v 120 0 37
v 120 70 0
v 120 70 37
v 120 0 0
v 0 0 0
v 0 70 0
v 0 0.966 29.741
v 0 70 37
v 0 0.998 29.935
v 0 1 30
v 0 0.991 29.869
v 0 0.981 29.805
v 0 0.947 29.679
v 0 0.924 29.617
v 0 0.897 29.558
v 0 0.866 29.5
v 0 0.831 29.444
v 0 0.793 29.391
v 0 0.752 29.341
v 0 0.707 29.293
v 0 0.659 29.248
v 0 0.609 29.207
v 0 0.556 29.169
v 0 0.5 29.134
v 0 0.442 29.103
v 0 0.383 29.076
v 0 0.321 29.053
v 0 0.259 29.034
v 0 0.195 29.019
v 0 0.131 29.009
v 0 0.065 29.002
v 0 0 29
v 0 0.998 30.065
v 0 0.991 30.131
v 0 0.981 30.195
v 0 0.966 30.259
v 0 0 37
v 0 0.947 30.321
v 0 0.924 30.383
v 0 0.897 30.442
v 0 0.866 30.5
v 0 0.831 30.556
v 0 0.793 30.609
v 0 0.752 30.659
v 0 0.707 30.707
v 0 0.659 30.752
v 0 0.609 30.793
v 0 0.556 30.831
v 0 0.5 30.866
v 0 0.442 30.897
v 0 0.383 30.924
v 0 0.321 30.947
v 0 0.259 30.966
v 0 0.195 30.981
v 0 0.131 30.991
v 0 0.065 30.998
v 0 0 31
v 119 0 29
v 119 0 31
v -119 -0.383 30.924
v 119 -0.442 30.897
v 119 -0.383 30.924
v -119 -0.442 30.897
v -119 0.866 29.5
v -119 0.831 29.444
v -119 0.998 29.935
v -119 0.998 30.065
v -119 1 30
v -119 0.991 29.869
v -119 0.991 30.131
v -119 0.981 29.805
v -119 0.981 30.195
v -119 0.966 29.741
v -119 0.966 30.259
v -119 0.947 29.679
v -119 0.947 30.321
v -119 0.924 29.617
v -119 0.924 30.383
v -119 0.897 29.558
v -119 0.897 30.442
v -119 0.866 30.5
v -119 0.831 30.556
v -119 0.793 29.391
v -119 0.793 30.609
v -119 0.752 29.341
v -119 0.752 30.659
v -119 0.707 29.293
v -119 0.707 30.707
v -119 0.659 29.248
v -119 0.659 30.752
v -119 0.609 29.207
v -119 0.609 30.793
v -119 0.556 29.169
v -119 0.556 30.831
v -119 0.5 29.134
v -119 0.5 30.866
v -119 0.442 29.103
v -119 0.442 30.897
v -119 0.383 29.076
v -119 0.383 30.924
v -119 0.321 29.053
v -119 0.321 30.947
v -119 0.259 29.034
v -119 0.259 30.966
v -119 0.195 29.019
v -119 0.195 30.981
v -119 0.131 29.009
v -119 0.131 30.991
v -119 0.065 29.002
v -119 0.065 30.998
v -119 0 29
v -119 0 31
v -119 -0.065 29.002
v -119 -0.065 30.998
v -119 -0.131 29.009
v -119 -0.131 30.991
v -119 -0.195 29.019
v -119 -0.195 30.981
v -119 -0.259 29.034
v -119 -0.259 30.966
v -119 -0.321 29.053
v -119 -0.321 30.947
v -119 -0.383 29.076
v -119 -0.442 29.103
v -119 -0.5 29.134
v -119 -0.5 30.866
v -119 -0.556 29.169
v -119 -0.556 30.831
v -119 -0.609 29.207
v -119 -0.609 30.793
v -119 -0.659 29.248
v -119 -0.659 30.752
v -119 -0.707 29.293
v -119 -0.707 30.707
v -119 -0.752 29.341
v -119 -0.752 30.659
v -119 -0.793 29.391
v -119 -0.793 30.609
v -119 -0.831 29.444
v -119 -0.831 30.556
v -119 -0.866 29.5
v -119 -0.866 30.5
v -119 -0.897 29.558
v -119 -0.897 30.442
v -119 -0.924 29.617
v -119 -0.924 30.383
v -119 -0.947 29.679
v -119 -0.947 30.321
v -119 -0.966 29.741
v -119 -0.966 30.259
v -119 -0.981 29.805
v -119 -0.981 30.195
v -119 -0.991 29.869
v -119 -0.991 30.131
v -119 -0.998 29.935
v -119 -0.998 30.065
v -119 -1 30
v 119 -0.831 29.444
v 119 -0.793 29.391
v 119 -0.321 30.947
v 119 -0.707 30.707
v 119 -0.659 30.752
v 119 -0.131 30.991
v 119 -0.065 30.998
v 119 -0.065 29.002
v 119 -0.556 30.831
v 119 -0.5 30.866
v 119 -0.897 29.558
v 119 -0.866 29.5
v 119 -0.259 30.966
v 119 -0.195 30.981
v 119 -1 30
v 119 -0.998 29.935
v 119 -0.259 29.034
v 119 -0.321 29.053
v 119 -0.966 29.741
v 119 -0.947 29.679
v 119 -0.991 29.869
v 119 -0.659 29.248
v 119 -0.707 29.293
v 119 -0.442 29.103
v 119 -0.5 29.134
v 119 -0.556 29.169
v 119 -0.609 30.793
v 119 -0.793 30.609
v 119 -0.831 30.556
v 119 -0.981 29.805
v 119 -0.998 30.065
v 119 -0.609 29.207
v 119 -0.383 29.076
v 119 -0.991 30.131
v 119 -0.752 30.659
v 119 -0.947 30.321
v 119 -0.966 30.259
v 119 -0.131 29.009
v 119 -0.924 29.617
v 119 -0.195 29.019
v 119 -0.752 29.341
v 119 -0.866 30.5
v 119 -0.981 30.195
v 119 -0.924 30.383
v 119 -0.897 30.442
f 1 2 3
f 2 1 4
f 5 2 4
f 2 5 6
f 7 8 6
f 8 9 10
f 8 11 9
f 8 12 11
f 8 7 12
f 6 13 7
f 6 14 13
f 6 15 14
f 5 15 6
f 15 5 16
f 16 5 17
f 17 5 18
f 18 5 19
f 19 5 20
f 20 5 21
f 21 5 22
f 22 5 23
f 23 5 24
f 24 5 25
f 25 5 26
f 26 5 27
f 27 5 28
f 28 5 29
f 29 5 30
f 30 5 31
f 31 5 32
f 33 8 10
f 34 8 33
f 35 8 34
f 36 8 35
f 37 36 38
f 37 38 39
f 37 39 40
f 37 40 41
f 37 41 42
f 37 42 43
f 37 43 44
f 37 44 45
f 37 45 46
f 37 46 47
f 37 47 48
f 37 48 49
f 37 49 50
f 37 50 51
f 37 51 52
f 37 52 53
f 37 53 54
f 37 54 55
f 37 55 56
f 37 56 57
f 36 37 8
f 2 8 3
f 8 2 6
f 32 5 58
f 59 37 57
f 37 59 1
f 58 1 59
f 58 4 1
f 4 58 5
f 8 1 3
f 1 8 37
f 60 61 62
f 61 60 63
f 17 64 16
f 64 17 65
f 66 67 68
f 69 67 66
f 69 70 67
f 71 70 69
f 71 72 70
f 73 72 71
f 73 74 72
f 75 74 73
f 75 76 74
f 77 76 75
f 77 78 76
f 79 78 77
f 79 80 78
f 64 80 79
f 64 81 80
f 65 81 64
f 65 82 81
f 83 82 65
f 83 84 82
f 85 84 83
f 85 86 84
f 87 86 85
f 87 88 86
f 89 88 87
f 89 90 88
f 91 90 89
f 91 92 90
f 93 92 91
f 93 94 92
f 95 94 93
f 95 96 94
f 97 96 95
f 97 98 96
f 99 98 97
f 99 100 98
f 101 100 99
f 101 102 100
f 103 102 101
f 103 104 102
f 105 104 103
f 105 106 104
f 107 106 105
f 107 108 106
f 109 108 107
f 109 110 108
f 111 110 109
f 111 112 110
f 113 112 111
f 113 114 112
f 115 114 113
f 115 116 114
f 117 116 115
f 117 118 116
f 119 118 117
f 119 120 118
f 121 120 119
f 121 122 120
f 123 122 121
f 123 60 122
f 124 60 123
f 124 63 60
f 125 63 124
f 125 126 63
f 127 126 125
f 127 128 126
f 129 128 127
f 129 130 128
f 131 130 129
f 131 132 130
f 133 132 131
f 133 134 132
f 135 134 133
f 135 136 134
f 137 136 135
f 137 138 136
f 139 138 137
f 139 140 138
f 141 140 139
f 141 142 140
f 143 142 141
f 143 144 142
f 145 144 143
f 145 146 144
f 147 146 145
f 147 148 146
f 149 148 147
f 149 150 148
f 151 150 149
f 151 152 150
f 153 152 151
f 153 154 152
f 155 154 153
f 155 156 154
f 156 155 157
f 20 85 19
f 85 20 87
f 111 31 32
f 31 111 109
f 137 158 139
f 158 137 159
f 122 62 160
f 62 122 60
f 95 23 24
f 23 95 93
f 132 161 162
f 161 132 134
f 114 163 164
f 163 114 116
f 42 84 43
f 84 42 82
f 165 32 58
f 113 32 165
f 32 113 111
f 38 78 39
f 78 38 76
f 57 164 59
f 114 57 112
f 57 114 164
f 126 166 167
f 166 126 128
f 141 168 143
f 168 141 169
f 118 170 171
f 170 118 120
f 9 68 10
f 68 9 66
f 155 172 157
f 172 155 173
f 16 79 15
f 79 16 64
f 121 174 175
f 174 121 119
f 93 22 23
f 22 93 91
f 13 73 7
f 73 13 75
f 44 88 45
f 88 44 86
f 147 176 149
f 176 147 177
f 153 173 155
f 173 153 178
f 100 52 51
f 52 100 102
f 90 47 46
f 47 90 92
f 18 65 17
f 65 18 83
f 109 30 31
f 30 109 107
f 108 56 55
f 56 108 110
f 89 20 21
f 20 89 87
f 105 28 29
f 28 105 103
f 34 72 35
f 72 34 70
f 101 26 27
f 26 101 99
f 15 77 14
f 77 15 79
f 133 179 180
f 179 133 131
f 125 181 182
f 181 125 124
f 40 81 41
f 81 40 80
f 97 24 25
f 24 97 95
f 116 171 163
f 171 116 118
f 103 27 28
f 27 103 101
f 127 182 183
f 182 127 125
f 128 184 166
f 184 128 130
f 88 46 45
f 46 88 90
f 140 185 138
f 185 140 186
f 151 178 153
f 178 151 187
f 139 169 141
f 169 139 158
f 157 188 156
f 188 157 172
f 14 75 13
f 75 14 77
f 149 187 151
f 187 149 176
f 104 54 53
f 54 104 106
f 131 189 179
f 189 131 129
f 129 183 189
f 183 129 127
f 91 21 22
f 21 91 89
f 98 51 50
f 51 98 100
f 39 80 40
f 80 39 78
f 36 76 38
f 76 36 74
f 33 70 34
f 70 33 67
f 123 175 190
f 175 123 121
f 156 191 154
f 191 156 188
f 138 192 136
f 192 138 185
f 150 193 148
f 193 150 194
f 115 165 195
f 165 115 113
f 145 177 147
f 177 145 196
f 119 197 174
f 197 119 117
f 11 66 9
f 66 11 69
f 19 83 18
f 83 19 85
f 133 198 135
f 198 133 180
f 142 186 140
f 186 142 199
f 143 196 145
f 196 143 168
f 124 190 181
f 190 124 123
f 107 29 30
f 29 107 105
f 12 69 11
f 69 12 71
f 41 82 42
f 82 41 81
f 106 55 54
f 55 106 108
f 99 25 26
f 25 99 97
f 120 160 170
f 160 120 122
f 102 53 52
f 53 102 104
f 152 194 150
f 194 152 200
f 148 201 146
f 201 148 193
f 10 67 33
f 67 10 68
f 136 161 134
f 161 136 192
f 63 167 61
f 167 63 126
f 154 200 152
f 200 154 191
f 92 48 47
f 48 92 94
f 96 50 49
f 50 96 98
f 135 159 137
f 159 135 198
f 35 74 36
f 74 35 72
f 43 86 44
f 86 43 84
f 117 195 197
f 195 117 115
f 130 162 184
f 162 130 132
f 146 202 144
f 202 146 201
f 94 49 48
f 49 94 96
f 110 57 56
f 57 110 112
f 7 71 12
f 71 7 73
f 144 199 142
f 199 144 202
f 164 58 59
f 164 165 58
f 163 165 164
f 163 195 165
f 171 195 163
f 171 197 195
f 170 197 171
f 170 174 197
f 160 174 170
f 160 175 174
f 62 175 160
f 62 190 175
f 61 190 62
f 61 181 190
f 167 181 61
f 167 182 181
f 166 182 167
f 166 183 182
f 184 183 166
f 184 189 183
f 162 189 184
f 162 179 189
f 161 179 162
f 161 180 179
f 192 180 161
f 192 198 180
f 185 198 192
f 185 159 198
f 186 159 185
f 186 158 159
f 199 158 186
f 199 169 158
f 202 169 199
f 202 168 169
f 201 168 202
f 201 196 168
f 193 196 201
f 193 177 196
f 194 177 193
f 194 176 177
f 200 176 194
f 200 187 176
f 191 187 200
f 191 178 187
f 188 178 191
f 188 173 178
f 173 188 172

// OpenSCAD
// Mini horizontal gel-electrophoresis box - buffer tank
// Print orientation: tank rests on XY plane (z = 0), builds upward (+Z)

// ---------------- Parameters ----------------
outer_x      = 120;   // outer length in X (mm)
outer_y      = 70;    // outer width in Y (mm)
outer_z      = 40;    // outer height in Z (mm)

wall         = 3;     // wall thickness (mm)
floor        = 3;     // floor thickness (mm)

platform_x   = 60;    // platform length along X (mm)
platform_y   = outer_y; // platform spans full inner width (mm)
platform_top = 13;    // platform top height above outer bottom (mm)

hole_d       = 2;     // electrode hole diameter (mm)
hole_y       = 0;     // electrode hole Y position (mm)
hole_z       = 30;    // electrode hole Z position (mm)

eps          = 0.5;   // cutter overshoot past faces (mm)
$fn          = 96;    // curve resolution

// Derived
inner_x = outer_x - 2 * wall;   // 114 mm
inner_z = outer_z - floor;      // 37 mm (floor at z = 0..3)
plat_h  = platform_top - floor; // 10 mm (platform sits on inner floor)

// ---------------- Model ----------------
union() {
    // Tank body (open top)
    difference() {
        cube([outer_x, outer_y, outer_z]);
        // open top: cut from z = outer_z - wall to top face
        translate([0, 0, outer_z - wall])
            cube([outer_x, outer_y, wall + eps]);
    }

    // Raised platform (divides bottom into two buffer chambers)
    translate([wall, 0, floor])
        cube([platform_x, platform_y, plat_h + eps]);

    // Electrode holes through each end wall, along X
    for (sx = [-1, 1])
        translate([sx * (outer_x / 2 - wall / 2), hole_y, hole_z])
            rotate([0, 90, 0])
                cylinder(d = hole_d, h = outer_x + 2 * eps, center = true);
}
